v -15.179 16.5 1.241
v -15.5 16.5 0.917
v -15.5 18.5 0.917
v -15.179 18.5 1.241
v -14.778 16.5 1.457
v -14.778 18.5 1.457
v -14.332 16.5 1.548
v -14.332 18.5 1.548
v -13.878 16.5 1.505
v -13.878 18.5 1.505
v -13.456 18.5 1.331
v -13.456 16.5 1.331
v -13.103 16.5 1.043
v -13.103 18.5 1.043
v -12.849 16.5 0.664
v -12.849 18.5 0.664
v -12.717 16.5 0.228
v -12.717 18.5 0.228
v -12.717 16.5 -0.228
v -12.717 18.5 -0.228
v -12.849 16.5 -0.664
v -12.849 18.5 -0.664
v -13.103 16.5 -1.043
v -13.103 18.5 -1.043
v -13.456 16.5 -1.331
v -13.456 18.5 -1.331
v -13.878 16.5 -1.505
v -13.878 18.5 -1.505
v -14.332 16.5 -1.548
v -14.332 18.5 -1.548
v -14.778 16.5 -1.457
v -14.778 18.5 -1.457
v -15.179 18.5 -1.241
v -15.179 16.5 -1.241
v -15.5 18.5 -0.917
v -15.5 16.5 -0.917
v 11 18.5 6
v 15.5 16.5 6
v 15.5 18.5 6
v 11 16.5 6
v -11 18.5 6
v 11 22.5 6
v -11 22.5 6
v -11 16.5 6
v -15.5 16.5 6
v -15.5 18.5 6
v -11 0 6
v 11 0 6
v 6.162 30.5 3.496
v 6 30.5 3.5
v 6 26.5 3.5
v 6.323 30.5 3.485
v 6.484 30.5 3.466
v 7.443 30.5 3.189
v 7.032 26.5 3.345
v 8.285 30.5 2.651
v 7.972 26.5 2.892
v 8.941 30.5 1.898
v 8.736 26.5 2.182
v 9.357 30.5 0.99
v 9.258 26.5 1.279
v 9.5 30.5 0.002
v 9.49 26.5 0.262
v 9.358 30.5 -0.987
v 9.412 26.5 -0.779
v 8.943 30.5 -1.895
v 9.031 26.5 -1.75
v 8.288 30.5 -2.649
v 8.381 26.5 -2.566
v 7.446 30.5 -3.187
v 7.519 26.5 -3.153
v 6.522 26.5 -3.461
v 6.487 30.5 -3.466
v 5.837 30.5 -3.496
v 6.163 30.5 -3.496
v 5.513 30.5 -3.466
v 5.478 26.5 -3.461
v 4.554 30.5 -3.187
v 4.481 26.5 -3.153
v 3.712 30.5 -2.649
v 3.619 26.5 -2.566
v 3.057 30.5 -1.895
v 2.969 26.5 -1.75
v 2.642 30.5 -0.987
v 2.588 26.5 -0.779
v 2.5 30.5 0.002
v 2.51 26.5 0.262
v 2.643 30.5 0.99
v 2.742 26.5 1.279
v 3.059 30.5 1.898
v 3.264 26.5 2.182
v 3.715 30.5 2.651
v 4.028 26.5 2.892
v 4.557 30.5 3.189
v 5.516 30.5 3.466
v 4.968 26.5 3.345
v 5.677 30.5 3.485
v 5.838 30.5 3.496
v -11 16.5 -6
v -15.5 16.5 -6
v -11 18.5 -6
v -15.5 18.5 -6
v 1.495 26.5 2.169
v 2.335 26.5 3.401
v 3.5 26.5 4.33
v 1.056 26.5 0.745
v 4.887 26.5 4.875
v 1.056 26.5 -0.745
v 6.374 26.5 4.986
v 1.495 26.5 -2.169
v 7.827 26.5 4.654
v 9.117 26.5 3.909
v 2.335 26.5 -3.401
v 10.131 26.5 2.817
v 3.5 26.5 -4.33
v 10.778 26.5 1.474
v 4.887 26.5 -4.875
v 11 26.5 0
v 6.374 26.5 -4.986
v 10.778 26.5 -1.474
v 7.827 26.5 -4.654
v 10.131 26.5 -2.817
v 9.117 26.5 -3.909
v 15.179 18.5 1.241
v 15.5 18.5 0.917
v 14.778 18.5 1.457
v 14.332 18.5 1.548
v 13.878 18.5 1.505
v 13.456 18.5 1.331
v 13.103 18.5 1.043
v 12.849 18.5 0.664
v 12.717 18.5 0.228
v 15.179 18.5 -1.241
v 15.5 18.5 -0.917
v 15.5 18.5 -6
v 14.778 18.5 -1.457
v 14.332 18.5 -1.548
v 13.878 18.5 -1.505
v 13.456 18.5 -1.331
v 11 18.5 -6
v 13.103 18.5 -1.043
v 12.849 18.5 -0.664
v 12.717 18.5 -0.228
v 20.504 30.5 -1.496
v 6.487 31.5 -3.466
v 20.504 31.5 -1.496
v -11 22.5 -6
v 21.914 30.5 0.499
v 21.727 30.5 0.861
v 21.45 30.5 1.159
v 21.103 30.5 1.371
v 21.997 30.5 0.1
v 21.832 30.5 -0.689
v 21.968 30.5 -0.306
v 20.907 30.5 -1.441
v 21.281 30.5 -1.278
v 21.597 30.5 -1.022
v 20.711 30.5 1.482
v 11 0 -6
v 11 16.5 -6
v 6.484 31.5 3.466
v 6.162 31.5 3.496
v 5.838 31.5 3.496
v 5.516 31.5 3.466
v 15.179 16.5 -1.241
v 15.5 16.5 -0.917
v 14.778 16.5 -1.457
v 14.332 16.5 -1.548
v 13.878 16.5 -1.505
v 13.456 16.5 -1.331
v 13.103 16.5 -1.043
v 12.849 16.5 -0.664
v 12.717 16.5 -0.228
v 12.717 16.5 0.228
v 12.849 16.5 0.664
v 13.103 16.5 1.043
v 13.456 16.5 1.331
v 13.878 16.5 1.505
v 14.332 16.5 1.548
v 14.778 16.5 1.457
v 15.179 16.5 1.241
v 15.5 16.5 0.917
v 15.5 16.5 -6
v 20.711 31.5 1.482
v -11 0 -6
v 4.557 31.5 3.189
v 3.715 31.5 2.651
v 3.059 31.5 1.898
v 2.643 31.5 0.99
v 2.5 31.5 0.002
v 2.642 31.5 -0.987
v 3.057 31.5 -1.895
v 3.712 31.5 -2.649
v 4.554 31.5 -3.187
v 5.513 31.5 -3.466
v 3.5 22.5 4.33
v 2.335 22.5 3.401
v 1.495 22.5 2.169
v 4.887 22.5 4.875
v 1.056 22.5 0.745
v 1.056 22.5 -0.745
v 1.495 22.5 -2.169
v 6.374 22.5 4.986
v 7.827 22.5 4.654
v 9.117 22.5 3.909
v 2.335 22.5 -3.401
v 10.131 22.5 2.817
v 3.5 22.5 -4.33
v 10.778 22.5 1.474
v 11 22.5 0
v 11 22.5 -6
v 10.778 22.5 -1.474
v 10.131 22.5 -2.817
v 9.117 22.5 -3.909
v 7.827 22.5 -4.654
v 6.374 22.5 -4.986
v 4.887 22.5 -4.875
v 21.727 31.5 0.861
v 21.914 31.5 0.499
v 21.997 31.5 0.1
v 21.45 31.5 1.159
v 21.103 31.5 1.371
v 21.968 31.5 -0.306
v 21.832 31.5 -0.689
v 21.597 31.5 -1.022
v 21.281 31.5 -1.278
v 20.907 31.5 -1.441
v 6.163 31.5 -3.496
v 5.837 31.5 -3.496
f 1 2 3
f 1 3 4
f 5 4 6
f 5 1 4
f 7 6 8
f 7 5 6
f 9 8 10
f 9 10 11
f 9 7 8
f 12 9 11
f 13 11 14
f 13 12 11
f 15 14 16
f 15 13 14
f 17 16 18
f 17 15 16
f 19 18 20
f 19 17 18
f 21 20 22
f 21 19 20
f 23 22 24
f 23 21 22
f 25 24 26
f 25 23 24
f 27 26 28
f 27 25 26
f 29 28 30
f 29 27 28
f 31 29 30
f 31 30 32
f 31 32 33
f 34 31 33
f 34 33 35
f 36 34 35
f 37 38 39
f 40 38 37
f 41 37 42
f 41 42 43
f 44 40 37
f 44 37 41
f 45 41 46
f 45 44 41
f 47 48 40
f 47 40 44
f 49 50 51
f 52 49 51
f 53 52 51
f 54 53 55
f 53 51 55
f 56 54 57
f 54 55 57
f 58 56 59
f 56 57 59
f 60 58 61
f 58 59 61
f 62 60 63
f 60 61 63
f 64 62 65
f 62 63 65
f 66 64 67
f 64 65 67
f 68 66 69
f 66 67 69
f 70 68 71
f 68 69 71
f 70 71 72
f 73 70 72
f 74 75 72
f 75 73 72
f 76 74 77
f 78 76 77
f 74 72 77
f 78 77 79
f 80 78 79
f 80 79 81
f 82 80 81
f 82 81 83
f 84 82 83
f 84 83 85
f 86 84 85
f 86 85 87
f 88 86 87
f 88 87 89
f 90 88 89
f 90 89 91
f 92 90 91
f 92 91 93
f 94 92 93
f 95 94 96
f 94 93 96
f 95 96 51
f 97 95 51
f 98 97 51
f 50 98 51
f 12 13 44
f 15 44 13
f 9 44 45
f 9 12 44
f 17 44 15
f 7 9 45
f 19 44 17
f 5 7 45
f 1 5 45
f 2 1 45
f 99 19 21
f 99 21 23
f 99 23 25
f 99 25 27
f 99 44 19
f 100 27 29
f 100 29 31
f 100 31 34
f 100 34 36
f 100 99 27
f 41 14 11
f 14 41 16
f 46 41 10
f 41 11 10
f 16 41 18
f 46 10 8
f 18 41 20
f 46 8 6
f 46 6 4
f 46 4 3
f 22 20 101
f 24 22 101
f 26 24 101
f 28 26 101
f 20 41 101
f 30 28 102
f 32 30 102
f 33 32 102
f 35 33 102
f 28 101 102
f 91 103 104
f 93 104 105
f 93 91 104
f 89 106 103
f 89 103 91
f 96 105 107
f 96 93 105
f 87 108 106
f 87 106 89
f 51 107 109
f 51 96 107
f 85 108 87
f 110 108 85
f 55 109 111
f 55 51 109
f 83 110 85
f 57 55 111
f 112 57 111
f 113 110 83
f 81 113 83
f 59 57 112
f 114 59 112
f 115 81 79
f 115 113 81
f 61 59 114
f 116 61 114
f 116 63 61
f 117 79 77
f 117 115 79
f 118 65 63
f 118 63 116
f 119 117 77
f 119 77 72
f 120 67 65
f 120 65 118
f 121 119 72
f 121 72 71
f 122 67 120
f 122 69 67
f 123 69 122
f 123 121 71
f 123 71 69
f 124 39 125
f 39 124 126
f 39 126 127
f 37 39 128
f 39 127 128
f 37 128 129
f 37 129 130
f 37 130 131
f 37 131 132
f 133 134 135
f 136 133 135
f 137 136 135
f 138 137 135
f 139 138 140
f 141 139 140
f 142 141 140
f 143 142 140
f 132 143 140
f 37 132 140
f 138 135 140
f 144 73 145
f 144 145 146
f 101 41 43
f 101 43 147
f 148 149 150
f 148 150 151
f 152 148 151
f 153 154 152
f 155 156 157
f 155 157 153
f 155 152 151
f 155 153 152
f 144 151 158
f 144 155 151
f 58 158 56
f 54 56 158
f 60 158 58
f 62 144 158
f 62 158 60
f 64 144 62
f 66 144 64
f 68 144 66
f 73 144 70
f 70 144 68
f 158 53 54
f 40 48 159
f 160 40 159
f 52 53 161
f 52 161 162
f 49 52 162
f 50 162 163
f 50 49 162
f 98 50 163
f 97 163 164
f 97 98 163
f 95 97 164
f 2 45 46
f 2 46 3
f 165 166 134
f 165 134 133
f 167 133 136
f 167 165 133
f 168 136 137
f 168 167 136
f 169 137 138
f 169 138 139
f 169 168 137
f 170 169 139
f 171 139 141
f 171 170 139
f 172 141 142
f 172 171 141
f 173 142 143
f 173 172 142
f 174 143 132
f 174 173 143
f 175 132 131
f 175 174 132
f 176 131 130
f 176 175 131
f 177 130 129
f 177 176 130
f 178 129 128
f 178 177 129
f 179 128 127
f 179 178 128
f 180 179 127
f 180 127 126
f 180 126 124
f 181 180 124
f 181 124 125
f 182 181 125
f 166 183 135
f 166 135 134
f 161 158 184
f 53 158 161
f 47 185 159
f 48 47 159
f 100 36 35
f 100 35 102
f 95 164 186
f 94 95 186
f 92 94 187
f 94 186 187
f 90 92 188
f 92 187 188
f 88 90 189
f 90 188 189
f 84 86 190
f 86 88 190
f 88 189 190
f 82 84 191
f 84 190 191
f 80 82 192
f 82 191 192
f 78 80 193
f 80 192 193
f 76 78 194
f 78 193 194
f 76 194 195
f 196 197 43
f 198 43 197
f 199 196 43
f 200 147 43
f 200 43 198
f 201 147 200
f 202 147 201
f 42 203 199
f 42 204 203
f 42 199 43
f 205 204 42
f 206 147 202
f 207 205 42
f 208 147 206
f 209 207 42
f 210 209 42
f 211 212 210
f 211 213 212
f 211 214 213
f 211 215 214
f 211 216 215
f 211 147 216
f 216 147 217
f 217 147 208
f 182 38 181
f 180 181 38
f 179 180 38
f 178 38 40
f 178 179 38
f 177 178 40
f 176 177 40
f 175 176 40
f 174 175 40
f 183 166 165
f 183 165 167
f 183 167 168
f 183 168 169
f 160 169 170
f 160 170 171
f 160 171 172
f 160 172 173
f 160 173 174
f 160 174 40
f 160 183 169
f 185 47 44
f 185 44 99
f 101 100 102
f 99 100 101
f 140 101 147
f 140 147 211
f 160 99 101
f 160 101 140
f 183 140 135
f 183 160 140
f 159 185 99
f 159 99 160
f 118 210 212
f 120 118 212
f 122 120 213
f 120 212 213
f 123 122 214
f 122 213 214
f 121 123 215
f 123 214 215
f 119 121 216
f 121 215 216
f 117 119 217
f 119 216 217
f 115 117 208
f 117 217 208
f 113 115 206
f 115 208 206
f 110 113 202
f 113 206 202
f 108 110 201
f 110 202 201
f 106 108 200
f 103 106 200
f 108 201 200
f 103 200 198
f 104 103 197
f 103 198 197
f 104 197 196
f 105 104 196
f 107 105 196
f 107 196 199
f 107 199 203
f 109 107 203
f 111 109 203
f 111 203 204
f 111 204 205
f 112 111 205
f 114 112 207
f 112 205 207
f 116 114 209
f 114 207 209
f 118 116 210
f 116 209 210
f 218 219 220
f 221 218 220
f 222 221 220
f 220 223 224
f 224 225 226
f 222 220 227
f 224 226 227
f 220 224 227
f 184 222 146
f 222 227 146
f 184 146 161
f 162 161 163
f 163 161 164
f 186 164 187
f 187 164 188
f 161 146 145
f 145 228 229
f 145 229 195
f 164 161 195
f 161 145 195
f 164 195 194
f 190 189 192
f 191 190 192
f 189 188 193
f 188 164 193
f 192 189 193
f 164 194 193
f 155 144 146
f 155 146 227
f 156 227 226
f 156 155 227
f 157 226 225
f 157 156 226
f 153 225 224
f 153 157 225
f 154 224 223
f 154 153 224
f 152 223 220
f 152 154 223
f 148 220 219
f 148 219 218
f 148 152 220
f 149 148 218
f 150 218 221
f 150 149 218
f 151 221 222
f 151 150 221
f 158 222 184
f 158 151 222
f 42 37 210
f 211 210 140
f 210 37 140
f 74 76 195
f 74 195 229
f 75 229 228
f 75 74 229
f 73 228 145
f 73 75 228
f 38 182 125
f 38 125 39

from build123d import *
from build123d.topology import SkipClean

# Parameters (mm, degrees)
SKETCH1_W           = 22
SKETCH1_H           = 12
BOSS_EXTRUDE1_DEPTH = 16.5
BOSS_EXTRUDE2_DEPTH = 2
SKETCH4_W           = 22
SKETCH4_H           = 12
BOSS_EXTRUDE3_DEPTH = 4
SKETCH5_R           = 5
BOSS_EXTRUDE4_DEPTH = 4
SKETCH7_R           = 3.5
BOSS_EXTRUDE5_DEPTH = 4
BOSS_EXTRUDE6_DEPTH = 1
CUT_EXTRUDE2_REACH  = 40.888


with BuildPart() as part:
    # Sketch1 → Boss-Extrude1 (new body)
    with BuildSketch(Plane(origin=(0, 0, 0), x_dir=(1, 0, 0), z_dir=(0, 1, 0))):
        Rectangle(SKETCH1_W, SKETCH1_H)
    extrude(amount=BOSS_EXTRUDE1_DEPTH)

    # Sketch2 → Boss-Extrude2 (add)
    with BuildSketch(Plane(origin=(0, 16.5, 0), x_dir=(1, 0, 0), z_dir=(0, 1, 0))):
        with BuildLine():
            Line((-15.5, 6), (15.5, 6))
            Line((15.5, 6), (15.5, 0.916515))
            ThreePointArc((15.5, 0.916515), (12.7, 0), (15.5, -0.916515))
            Line((15.5, -0.916515), (15.5, -6))
            Line((15.5, -6), (-15.5, -6))
            Line((-15.5, -6), (-15.5, -0.916515))
            ThreePointArc((-15.5, -0.916515), (-12.7, 0), (-15.5, 0.916515))
            Line((-15.5, 0.916515), (-15.5, 6))
        make_face()
    extrude(amount=BOSS_EXTRUDE2_DEPTH)

    # Sketch4 → Boss-Extrude3 (add)
    with BuildSketch(Plane(origin=(0, 18.5, 0), x_dir=(1, 0, 0), z_dir=(0, 1, 0))):
        Rectangle(SKETCH4_W, SKETCH4_H)
    extrude(amount=BOSS_EXTRUDE3_DEPTH)

    # Sketch5 → Boss-Extrude4 (add)
    with BuildSketch(Plane(origin=(0, 22.5, 0), x_dir=(1, 0, 0), z_dir=(0, 1, 0))):
        with Locations((6, 0)):
            Circle(SKETCH5_R)
    extrude(amount=BOSS_EXTRUDE4_DEPTH)

    # Sketch7 → Boss-Extrude5 (add)
    with BuildSketch(Plane(origin=(0, 26.5, 0), x_dir=(1, 0, 0), z_dir=(0, 1, 0))):
        with Locations(Location((6, 0, 0), (0, 0, 270))):
            Circle(SKETCH7_R)
    extrude(amount=BOSS_EXTRUDE5_DEPTH)

    # Sketch8 → Boss-Extrude6 (add)
    with SkipClean():  # the faces are left unmerged after this step: merging them gives an invalid solid
        with BuildSketch(Plane(origin=(0, 30.5, 0), x_dir=(1, 0, 0), z_dir=(0, 1, 0))):
            with BuildLine():
                Line((5.516407, -3.46643), (-8.710709, -1.481642))
                ThreePointArc((-8.710709, -1.481642), (-9.996409, 0.103599), (-8.504009, 1.495991))
                Line((-8.504009, 1.495991), (5.512894, 3.465938))
                ThreePointArc((5.512894, 3.465938), (6, 3.5), (6.487106, 3.465938))
                Line((6.487106, 3.465938), (20.504009, 1.495991))
                ThreePointArc((20.504009, 1.495991), (21.996409, 0.103599), (20.710709, -1.481642))
                Line((20.710709, -1.481642), (6.483593, -3.46643))
                ThreePointArc((6.483593, -3.46643), (6, -3.5), (5.516407, -3.46643))
            make_face()
        extrude(amount=BOSS_EXTRUDE6_DEPTH)

    # Sketch10 → Cut-Extrude2 (cut, up to next)
    with BuildSketch(Plane(origin=(0, 31.5, 0), x_dir=(1, 0, 0), z_dir=(0, 1, 0)), mode=Mode.PRIVATE) as cut_extrude2_sk1:
        with BuildLine():
            Line((-8.710709, -1.481642), (5.516407, -3.46643))
            ThreePointArc((5.516407, -3.46643), (2.5, -0.001774), (5.512894, 3.465938))
            Line((5.512894, 3.465938), (-8.504009, 1.495991))
            ThreePointArc((-8.504009, 1.495991), (-9.996409, 0.103599), (-8.710709, -1.481642))
        make_face()
    cut_extrude2_tool1 = extrude(cut_extrude2_sk1.sketch, amount=-CUT_EXTRUDE2_REACH, mode=Mode.PRIVATE) & part.part
    add(cut_extrude2_tool1.solids().sort_by_distance((-2.43068, 31.5, 0.003848))[0], mode=Mode.SUBTRACT)


solid = part.part
